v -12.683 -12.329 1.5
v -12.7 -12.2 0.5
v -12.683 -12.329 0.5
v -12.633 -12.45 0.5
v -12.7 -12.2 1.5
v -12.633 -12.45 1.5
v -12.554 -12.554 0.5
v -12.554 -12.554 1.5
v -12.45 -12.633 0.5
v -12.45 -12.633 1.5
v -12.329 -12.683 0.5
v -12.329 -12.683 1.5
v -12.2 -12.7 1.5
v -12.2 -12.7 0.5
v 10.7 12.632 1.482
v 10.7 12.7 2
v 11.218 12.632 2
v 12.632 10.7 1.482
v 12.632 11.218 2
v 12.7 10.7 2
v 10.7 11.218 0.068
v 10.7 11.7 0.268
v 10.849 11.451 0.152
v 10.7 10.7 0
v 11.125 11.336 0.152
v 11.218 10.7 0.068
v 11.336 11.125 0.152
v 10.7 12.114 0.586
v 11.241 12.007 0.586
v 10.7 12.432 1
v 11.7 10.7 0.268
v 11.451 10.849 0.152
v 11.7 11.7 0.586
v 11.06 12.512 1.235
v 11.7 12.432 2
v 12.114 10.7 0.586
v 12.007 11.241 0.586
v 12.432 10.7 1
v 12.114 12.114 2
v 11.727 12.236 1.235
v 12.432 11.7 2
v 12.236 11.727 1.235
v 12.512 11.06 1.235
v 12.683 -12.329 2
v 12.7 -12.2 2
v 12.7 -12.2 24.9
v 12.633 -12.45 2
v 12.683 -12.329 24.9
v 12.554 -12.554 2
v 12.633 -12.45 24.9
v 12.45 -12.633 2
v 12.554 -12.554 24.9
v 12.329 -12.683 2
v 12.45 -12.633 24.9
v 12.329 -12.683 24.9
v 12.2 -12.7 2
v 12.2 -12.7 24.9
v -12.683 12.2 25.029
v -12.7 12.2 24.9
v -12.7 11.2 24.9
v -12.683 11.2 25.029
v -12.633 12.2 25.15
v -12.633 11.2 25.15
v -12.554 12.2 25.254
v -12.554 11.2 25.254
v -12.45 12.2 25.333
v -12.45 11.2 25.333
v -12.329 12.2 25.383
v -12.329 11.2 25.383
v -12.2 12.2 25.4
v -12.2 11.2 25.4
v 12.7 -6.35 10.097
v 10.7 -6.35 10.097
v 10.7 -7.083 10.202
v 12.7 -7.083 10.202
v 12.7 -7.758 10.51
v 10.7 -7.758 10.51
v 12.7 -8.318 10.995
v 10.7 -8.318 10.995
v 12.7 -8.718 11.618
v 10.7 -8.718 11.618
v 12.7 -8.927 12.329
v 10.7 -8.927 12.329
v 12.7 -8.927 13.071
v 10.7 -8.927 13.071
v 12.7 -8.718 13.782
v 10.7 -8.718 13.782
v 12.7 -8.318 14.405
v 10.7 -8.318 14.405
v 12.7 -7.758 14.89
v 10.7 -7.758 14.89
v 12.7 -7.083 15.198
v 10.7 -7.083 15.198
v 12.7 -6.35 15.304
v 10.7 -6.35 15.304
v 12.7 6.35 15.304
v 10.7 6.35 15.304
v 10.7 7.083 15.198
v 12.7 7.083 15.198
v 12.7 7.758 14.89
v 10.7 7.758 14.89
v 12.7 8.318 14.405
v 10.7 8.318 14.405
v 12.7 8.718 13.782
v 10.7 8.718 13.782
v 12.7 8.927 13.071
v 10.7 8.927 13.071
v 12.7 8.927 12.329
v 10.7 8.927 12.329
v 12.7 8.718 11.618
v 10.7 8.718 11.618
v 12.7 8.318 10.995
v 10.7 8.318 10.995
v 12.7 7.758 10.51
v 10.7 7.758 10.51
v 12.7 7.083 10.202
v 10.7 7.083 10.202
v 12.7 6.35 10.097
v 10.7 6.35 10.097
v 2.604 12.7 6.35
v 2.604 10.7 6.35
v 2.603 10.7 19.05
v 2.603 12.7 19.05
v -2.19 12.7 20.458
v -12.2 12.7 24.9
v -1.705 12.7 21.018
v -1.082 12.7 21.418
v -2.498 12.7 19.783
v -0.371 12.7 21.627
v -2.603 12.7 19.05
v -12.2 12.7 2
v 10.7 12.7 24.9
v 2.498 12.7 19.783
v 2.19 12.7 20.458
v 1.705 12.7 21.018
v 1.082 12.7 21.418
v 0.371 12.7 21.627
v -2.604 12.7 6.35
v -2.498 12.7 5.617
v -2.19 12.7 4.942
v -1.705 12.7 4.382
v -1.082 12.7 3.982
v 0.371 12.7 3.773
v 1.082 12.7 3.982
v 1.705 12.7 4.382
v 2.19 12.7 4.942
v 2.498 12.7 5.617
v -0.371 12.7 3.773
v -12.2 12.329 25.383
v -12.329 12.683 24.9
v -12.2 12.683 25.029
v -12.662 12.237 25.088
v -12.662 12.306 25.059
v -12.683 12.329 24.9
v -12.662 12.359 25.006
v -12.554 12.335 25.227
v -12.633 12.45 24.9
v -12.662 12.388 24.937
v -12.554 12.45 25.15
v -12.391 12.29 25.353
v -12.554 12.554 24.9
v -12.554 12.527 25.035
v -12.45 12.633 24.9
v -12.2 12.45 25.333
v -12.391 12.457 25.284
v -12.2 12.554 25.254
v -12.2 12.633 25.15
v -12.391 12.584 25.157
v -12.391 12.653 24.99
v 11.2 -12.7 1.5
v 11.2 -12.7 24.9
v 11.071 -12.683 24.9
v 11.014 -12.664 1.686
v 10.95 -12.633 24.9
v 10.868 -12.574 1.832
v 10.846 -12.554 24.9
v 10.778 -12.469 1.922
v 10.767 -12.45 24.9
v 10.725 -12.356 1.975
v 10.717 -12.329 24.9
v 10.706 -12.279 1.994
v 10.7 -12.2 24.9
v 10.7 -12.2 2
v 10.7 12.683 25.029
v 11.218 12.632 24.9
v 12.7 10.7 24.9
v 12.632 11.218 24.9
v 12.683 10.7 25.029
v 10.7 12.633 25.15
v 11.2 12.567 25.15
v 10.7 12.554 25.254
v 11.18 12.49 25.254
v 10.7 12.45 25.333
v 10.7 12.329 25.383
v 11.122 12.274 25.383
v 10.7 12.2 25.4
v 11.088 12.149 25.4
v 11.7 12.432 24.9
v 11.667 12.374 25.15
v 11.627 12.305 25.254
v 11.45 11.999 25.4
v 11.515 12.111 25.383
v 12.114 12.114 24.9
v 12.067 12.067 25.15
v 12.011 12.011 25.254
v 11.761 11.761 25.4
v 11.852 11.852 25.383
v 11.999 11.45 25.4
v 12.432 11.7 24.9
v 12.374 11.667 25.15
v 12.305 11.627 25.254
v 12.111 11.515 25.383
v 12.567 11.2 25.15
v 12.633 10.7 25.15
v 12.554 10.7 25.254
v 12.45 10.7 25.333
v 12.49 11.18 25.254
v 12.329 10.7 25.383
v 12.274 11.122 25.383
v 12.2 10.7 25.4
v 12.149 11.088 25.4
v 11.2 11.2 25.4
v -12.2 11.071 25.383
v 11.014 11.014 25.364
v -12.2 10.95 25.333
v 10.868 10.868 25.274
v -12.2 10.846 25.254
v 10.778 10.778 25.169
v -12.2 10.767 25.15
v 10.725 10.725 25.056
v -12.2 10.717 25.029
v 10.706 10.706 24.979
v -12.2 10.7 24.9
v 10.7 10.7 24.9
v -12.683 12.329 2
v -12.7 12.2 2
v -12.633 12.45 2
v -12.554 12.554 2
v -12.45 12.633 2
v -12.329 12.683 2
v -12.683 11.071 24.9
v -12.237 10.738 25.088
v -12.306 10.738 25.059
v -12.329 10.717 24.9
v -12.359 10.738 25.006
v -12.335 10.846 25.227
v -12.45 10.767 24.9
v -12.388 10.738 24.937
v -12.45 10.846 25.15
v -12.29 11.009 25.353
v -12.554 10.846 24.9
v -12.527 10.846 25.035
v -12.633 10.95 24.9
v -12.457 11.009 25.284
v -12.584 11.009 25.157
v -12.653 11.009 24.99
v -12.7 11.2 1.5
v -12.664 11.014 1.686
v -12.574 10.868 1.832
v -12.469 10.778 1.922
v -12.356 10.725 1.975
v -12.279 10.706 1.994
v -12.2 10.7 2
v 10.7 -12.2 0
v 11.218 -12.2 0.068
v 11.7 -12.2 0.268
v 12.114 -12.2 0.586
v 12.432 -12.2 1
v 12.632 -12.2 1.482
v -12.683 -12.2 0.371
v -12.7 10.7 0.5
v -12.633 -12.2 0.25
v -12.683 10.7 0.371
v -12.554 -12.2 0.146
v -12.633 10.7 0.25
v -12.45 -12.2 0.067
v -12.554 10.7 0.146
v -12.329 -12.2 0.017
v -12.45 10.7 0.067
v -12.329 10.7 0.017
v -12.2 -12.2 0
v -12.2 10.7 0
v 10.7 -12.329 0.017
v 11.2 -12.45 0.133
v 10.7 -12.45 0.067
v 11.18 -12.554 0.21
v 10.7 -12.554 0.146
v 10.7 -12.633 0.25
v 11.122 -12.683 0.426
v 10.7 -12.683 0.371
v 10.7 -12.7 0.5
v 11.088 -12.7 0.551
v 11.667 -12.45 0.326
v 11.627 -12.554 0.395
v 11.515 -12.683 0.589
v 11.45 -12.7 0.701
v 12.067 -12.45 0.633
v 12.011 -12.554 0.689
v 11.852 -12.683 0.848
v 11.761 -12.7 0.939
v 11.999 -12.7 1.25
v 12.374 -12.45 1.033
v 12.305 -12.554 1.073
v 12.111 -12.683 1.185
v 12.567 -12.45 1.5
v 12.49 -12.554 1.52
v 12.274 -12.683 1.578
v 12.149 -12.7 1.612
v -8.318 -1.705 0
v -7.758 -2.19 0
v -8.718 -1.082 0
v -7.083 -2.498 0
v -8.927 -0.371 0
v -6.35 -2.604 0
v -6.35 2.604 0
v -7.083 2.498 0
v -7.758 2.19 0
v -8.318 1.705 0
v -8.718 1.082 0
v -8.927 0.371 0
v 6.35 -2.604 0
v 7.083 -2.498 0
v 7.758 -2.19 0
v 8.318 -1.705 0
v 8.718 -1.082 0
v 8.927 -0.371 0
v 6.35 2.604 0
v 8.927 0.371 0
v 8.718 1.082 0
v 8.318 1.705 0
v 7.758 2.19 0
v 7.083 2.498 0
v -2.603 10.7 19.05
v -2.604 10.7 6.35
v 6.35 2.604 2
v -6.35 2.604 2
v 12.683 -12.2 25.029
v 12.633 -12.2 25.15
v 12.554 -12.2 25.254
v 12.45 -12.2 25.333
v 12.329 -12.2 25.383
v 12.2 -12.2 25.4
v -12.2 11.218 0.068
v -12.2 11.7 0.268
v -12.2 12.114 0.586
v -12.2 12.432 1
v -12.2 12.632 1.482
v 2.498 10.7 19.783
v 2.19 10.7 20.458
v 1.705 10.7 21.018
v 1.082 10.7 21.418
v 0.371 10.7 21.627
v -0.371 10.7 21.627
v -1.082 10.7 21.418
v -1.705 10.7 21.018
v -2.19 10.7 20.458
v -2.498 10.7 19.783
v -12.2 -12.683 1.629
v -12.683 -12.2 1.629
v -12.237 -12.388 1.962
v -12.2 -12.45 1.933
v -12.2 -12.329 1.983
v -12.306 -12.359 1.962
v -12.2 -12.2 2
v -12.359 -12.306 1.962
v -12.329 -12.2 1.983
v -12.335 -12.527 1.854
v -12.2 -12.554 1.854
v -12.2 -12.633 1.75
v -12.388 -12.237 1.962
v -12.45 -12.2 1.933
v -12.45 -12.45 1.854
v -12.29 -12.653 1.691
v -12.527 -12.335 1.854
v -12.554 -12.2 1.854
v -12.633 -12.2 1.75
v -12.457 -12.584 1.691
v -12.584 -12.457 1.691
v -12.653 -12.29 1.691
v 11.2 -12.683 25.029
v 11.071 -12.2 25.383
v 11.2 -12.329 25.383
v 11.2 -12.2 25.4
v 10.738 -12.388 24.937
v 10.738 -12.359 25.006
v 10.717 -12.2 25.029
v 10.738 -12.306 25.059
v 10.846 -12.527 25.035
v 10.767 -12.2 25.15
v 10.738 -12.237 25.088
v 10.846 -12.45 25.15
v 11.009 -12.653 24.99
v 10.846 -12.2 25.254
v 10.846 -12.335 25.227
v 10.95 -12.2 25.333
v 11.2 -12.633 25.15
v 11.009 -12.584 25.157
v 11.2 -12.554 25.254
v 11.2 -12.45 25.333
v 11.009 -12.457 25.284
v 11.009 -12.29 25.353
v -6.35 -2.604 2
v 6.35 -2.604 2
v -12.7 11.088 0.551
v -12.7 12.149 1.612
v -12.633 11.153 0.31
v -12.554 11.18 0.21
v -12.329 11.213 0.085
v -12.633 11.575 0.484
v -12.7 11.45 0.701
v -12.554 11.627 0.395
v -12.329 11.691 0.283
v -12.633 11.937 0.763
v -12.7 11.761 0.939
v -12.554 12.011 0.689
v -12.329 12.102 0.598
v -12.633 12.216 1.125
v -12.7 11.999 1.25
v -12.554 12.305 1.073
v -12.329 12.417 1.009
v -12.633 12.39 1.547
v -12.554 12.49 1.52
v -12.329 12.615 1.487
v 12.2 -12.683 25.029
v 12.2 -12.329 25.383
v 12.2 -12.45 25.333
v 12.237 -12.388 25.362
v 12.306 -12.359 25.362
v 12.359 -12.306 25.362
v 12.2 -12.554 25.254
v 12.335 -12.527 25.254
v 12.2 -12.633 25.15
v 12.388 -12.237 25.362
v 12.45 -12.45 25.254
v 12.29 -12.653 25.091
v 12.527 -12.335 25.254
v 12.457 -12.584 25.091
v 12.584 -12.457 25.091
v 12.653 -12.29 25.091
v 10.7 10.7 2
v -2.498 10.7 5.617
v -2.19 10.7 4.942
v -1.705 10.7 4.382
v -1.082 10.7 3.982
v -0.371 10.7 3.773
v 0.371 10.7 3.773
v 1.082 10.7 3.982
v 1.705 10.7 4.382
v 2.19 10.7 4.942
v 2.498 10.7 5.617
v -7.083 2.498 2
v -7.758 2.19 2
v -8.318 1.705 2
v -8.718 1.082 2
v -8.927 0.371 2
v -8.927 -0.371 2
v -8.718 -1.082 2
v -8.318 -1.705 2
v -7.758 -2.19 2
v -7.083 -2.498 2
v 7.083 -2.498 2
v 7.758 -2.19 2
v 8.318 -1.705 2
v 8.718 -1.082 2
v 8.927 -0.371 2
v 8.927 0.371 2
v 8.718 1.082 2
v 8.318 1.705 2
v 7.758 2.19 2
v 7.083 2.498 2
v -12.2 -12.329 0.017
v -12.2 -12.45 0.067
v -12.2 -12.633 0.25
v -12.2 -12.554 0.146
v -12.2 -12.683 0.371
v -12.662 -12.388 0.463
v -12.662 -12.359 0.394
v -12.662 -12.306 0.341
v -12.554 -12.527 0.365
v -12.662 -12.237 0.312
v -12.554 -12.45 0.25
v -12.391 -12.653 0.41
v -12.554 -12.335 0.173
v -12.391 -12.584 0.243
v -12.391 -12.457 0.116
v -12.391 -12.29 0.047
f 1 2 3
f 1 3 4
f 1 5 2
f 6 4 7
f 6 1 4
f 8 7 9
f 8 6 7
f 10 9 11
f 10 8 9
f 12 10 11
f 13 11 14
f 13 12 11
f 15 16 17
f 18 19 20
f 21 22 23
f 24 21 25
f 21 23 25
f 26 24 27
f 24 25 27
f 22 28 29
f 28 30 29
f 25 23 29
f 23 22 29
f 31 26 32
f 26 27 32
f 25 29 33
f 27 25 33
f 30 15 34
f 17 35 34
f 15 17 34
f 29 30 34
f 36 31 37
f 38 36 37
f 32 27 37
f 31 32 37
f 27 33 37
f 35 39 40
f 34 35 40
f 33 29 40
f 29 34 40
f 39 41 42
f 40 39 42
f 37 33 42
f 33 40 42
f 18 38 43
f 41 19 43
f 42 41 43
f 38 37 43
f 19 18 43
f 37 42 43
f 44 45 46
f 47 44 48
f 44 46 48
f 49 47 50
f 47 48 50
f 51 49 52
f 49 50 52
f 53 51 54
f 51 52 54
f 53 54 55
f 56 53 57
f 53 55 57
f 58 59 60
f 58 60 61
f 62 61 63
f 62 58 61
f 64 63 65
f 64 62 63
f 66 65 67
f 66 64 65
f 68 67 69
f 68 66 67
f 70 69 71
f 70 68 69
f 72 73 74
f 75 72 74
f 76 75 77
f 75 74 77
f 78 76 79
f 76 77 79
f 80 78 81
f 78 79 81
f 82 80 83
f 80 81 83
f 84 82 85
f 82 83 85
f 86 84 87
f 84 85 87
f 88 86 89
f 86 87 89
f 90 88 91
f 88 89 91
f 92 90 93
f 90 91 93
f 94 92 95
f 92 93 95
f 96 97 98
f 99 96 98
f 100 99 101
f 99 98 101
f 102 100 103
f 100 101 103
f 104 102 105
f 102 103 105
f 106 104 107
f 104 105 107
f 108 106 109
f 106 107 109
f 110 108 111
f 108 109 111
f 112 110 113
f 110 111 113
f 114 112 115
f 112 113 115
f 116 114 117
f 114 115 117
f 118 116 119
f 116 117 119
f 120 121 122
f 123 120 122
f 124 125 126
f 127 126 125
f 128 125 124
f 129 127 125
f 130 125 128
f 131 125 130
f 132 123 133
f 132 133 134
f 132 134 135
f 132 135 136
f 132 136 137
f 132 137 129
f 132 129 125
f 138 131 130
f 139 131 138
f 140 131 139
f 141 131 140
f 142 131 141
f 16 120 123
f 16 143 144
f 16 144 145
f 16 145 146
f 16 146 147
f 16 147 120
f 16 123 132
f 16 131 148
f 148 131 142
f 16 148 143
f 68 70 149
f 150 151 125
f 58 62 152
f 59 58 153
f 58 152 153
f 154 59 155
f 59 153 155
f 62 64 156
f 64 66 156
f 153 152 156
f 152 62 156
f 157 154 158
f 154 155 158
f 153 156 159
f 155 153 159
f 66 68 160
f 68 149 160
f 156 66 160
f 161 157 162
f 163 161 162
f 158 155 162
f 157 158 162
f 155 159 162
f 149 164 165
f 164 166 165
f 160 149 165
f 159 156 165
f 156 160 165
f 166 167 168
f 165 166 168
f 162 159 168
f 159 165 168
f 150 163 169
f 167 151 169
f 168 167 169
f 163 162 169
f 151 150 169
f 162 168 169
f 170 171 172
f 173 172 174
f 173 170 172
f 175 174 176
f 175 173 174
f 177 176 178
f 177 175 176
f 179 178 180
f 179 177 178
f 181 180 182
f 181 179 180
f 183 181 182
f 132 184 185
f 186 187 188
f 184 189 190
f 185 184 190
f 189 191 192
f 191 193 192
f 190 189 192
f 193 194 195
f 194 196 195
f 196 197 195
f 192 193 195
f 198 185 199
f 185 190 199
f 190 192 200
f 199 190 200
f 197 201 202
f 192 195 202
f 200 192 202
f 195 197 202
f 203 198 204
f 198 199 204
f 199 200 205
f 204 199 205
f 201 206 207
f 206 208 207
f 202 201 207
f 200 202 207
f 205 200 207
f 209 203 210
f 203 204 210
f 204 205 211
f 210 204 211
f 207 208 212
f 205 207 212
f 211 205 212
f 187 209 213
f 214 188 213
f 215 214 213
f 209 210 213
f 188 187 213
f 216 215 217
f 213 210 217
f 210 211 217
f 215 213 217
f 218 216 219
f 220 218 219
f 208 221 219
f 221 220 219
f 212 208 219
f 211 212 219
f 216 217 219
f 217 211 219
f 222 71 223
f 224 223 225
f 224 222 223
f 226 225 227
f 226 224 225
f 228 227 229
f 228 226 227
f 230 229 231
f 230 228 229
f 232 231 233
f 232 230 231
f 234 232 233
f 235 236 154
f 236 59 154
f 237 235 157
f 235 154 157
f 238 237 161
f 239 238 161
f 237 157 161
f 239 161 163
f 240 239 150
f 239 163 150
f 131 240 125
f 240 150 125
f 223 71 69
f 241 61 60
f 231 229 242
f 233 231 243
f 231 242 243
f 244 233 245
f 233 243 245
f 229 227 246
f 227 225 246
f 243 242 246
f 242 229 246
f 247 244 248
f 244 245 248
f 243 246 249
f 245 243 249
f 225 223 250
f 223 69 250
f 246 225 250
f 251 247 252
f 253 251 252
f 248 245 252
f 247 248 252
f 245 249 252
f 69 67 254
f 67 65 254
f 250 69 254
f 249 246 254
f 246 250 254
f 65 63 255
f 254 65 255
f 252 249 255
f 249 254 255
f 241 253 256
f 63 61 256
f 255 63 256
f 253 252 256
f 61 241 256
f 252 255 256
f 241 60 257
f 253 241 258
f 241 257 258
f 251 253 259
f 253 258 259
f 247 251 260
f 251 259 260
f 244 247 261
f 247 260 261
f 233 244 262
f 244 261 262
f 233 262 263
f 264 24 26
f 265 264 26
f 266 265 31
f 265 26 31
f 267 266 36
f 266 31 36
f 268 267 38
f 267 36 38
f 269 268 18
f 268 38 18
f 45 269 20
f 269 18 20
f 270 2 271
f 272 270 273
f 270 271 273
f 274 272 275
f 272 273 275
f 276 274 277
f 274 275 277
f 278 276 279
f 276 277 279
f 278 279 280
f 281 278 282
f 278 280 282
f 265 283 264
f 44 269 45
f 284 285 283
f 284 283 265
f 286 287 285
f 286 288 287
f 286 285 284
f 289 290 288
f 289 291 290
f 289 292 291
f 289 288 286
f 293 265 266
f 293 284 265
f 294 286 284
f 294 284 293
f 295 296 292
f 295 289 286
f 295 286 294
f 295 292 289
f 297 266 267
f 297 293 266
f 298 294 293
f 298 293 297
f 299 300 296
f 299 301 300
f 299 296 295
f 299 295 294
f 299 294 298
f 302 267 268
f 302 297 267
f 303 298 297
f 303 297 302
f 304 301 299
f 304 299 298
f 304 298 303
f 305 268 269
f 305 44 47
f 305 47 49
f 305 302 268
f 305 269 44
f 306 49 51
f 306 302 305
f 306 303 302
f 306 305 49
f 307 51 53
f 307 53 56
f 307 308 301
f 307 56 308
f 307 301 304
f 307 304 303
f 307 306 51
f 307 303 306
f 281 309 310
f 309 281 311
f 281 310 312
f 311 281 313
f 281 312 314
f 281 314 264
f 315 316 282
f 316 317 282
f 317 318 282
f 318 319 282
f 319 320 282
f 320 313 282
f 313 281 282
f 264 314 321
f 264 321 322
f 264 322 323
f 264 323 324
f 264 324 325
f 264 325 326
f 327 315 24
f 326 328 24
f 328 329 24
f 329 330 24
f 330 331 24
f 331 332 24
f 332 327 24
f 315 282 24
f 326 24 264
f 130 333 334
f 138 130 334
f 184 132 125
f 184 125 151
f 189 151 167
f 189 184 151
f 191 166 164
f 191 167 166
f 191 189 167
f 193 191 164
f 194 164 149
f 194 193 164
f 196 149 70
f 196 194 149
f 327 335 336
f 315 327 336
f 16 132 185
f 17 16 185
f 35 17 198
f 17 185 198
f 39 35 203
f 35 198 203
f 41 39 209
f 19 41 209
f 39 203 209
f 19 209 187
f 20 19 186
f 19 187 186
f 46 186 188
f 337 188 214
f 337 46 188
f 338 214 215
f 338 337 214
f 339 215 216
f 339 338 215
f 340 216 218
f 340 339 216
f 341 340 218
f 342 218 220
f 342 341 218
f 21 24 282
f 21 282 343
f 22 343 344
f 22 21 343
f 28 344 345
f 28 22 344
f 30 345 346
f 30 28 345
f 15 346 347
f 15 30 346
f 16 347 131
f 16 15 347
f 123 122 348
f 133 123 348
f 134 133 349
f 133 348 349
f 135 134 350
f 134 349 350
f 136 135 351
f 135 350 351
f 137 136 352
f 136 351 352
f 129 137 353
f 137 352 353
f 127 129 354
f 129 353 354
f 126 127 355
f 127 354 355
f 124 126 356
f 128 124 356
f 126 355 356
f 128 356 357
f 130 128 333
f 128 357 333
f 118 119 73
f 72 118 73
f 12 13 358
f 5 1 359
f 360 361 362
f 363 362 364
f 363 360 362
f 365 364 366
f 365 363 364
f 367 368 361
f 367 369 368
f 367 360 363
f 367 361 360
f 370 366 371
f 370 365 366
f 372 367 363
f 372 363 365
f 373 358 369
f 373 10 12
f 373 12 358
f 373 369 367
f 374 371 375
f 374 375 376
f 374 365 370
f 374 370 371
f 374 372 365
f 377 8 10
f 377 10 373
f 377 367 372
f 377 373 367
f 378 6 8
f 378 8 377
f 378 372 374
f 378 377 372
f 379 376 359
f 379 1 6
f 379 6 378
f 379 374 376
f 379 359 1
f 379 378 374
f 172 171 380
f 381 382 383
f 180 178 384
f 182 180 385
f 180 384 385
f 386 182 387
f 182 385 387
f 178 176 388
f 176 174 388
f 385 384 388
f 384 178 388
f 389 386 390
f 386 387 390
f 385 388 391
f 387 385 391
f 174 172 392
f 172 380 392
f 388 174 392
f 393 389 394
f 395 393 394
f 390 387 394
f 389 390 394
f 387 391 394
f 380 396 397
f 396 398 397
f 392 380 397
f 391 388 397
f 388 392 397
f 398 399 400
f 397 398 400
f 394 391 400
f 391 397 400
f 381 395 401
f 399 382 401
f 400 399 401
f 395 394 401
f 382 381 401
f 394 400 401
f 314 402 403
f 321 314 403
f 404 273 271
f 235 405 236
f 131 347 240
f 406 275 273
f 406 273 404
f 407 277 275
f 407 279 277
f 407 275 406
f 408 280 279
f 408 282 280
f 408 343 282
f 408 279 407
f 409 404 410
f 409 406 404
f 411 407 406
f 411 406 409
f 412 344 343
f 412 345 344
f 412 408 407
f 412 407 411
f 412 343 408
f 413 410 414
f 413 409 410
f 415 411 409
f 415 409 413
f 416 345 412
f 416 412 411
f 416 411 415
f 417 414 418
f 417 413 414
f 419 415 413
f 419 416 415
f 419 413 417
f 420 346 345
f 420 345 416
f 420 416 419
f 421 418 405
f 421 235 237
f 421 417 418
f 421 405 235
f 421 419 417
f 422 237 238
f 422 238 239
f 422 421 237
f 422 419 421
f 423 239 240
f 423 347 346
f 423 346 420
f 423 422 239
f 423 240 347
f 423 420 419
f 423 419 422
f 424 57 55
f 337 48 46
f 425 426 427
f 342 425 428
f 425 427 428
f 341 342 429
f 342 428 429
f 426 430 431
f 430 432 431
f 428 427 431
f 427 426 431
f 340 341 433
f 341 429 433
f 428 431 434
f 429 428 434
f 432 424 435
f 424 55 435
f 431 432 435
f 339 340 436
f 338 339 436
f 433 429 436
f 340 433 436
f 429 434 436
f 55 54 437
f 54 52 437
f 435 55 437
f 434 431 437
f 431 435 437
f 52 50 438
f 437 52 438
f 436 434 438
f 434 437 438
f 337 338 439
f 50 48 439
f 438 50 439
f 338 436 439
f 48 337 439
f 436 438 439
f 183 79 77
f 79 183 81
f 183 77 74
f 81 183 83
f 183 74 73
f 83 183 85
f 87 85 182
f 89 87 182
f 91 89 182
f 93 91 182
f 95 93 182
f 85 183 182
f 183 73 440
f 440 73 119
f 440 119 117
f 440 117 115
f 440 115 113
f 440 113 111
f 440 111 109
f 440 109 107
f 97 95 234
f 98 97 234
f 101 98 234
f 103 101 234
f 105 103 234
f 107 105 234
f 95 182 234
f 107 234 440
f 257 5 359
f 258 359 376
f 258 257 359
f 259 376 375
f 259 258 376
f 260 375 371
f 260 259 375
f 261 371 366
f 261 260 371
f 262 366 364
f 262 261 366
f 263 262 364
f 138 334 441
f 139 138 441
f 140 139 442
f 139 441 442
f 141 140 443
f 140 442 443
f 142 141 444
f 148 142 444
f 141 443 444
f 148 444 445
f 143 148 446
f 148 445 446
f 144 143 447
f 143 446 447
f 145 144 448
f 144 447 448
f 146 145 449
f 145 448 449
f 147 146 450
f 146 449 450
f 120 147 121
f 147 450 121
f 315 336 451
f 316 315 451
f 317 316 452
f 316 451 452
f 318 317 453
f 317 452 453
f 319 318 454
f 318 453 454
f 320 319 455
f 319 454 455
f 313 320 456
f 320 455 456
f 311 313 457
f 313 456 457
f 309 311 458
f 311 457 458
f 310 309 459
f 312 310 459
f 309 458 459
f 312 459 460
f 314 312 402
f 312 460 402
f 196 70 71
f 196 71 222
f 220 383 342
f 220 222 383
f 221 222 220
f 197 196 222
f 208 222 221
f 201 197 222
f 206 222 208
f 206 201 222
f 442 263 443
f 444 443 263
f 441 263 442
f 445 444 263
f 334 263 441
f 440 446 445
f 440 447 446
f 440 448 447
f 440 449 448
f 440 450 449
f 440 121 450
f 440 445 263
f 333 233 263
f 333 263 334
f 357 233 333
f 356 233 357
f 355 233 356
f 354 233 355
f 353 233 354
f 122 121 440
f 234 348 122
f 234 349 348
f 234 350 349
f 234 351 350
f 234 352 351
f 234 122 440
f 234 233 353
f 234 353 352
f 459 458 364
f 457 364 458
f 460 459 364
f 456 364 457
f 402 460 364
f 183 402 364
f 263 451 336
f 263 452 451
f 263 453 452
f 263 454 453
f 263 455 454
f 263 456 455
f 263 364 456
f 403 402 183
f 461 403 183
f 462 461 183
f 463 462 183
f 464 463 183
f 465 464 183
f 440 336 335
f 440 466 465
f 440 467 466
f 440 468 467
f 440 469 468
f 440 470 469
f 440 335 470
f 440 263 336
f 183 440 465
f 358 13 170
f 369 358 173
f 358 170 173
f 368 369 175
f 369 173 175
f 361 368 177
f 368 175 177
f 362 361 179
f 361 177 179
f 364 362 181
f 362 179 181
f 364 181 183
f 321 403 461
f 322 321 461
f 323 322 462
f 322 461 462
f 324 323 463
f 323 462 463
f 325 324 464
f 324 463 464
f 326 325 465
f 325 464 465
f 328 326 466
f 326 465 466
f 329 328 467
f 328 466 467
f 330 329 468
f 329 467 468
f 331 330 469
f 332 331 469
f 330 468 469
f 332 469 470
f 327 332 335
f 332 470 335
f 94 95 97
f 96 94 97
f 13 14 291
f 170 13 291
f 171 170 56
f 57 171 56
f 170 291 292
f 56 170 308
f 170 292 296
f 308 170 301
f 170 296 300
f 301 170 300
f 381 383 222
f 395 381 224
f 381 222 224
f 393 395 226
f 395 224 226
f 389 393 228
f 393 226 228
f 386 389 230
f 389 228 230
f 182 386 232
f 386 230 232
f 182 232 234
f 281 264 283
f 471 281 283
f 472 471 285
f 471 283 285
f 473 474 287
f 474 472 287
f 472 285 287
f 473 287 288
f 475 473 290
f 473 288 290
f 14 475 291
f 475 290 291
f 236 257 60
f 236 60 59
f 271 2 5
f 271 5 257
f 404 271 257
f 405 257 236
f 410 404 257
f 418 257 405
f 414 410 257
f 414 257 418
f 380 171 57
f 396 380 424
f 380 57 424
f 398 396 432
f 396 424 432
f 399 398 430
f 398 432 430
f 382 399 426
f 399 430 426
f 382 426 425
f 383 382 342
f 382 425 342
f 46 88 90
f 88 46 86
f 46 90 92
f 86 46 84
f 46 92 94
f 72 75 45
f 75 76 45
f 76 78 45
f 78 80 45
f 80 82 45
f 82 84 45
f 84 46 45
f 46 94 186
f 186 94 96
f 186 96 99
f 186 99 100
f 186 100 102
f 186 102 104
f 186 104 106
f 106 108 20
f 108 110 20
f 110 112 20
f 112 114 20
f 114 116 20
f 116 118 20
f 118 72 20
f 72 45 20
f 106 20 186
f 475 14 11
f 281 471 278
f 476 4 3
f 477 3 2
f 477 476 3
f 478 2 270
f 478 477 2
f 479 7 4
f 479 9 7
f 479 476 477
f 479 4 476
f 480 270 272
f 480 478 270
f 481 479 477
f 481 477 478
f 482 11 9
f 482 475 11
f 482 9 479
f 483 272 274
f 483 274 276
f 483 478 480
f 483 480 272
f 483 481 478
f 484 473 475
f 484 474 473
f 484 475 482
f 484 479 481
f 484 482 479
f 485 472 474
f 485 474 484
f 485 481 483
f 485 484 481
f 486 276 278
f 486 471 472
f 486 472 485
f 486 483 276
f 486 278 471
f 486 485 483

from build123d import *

# Parameters (mm, degrees)
SKETCH014_W     = 25.4
SKETCH014_H     = 25.4
PAD007_DEPTH    = 25.4
SKETCH015_W     = 23.4
SKETCH015_H     = 23.4
POCKET005_DEPTH = 23.4
POCKET006_DEPTH = 2.001
POCKET007_DEPTH = 2.001
POCKET008_DEPTH = 2.001
FILLET005_R     = 2
FILLET006_R     = 0.5


with BuildPart() as part:
    # Sketch014 → Pad007 (new body)
    with BuildSketch(Plane.XY):
        Rectangle(SKETCH014_W, SKETCH014_H)
    extrude(amount=PAD007_DEPTH)

    # Sketch015 (on Face6 of Pad007) → Pocket005 (cut)
    with BuildSketch(Plane.XY.offset(25.4)):
        with Locations((-1, -1)):
            Rectangle(SKETCH015_W, SKETCH015_H)
    extrude(amount=-POCKET005_DEPTH, mode=Mode.SUBTRACT)

    # Sketch016 (on Face7 of Pocket005) → Pocket006 (cut, through all)
    with BuildSketch(Plane.XY.offset(2)):
        with BuildLine():
            ThreePointArc((-6.35, 2.6035), (-8.9535, 0), (-6.35, -2.6035))
            Line((-6.35, -2.6035), (6.35, -2.6035))
            ThreePointArc((6.35, -2.6035), (8.9535, 0), (6.35, 2.6035))
            Line((6.35, 2.6035), (-6.35, 2.6035))
        make_face()
    extrude(amount=-POCKET006_DEPTH, mode=Mode.SUBTRACT)

    # Sketch017 (on Face6 of Pocket006) → Pocket007 (cut, through all)
    with BuildSketch(Plane(origin=(10.7, 0, 0), x_dir=(0, -1, 0), z_dir=(-1, 0, 0))):
        with BuildLine():
            ThreePointArc((-6.35, 15.3035), (-8.9535, 12.7), (-6.35, 10.0965))
            Line((-6.35, 10.0965), (6.35, 10.0965))
            ThreePointArc((6.35, 10.0965), (8.9535, 12.7), (6.35, 15.3035))
            Line((6.35, 15.3035), (-6.35, 15.3035))
        make_face()
    extrude(amount=-POCKET007_DEPTH, mode=Mode.SUBTRACT)

    # Sketch018 (on Face17 of Pocket007) → Pocket008 (cut, through all)
    with BuildSketch(Plane.XZ.offset(-10.7)):
        with BuildLine():
            ThreePointArc((2.6035, 19.05), (0, 21.6535), (-2.6035, 19.05))
            Line((-2.6035, 19.05), (-2.6035, 6.35))
            ThreePointArc((-2.6035, 6.35), (0, 3.7465), (2.6035, 6.35))
            Line((2.6035, 6.35), (2.6035, 19.05))
        make_face()
    extrude(amount=-POCKET008_DEPTH, mode=Mode.SUBTRACT)

    # Fillet005
    fillet005_edges = [part.edges().sort_by_distance(p)[0] for p in [
        (12.7, 12.7, 12.7),
        (0, 12.7, 0),
        (12.7, 0, 0),
    ]]
    fillet(fillet005_edges, radius=FILLET005_R)

    # Fillet006
    fillet006_edges = [part.edges().sort_by_distance(p)[0] for p in [
        (-1, -12.7, 0),
        (12.114214, -12.7, 0.585786),
        (-12.7, -12.7, 1),
        (12.7, -12.7, 13.7),
        (-1, -12.7, 2),
        (11.7, -12.7, 25.4),
        (10.7, -12.7, 13.7),
        (-1, 12.7, 25.4),
        (12.114214, 12.114214, 25.4),
        (-12.7, 11.7, 25.4),
        (12.7, -1, 25.4),
        (-1, 10.7, 25.4),
        (10.7, -1, 25.4),
        (-12.7, -1, 0),
        (-12.7, 12.114214, 0.585786),
        (-12.7, 12.7, 13.7),
        (-12.7, -1, 2),
        (-12.7, 10.7, 13.7),
    ]]
    fillet(fillet006_edges, radius=FILLET006_R)


solid = part.part
